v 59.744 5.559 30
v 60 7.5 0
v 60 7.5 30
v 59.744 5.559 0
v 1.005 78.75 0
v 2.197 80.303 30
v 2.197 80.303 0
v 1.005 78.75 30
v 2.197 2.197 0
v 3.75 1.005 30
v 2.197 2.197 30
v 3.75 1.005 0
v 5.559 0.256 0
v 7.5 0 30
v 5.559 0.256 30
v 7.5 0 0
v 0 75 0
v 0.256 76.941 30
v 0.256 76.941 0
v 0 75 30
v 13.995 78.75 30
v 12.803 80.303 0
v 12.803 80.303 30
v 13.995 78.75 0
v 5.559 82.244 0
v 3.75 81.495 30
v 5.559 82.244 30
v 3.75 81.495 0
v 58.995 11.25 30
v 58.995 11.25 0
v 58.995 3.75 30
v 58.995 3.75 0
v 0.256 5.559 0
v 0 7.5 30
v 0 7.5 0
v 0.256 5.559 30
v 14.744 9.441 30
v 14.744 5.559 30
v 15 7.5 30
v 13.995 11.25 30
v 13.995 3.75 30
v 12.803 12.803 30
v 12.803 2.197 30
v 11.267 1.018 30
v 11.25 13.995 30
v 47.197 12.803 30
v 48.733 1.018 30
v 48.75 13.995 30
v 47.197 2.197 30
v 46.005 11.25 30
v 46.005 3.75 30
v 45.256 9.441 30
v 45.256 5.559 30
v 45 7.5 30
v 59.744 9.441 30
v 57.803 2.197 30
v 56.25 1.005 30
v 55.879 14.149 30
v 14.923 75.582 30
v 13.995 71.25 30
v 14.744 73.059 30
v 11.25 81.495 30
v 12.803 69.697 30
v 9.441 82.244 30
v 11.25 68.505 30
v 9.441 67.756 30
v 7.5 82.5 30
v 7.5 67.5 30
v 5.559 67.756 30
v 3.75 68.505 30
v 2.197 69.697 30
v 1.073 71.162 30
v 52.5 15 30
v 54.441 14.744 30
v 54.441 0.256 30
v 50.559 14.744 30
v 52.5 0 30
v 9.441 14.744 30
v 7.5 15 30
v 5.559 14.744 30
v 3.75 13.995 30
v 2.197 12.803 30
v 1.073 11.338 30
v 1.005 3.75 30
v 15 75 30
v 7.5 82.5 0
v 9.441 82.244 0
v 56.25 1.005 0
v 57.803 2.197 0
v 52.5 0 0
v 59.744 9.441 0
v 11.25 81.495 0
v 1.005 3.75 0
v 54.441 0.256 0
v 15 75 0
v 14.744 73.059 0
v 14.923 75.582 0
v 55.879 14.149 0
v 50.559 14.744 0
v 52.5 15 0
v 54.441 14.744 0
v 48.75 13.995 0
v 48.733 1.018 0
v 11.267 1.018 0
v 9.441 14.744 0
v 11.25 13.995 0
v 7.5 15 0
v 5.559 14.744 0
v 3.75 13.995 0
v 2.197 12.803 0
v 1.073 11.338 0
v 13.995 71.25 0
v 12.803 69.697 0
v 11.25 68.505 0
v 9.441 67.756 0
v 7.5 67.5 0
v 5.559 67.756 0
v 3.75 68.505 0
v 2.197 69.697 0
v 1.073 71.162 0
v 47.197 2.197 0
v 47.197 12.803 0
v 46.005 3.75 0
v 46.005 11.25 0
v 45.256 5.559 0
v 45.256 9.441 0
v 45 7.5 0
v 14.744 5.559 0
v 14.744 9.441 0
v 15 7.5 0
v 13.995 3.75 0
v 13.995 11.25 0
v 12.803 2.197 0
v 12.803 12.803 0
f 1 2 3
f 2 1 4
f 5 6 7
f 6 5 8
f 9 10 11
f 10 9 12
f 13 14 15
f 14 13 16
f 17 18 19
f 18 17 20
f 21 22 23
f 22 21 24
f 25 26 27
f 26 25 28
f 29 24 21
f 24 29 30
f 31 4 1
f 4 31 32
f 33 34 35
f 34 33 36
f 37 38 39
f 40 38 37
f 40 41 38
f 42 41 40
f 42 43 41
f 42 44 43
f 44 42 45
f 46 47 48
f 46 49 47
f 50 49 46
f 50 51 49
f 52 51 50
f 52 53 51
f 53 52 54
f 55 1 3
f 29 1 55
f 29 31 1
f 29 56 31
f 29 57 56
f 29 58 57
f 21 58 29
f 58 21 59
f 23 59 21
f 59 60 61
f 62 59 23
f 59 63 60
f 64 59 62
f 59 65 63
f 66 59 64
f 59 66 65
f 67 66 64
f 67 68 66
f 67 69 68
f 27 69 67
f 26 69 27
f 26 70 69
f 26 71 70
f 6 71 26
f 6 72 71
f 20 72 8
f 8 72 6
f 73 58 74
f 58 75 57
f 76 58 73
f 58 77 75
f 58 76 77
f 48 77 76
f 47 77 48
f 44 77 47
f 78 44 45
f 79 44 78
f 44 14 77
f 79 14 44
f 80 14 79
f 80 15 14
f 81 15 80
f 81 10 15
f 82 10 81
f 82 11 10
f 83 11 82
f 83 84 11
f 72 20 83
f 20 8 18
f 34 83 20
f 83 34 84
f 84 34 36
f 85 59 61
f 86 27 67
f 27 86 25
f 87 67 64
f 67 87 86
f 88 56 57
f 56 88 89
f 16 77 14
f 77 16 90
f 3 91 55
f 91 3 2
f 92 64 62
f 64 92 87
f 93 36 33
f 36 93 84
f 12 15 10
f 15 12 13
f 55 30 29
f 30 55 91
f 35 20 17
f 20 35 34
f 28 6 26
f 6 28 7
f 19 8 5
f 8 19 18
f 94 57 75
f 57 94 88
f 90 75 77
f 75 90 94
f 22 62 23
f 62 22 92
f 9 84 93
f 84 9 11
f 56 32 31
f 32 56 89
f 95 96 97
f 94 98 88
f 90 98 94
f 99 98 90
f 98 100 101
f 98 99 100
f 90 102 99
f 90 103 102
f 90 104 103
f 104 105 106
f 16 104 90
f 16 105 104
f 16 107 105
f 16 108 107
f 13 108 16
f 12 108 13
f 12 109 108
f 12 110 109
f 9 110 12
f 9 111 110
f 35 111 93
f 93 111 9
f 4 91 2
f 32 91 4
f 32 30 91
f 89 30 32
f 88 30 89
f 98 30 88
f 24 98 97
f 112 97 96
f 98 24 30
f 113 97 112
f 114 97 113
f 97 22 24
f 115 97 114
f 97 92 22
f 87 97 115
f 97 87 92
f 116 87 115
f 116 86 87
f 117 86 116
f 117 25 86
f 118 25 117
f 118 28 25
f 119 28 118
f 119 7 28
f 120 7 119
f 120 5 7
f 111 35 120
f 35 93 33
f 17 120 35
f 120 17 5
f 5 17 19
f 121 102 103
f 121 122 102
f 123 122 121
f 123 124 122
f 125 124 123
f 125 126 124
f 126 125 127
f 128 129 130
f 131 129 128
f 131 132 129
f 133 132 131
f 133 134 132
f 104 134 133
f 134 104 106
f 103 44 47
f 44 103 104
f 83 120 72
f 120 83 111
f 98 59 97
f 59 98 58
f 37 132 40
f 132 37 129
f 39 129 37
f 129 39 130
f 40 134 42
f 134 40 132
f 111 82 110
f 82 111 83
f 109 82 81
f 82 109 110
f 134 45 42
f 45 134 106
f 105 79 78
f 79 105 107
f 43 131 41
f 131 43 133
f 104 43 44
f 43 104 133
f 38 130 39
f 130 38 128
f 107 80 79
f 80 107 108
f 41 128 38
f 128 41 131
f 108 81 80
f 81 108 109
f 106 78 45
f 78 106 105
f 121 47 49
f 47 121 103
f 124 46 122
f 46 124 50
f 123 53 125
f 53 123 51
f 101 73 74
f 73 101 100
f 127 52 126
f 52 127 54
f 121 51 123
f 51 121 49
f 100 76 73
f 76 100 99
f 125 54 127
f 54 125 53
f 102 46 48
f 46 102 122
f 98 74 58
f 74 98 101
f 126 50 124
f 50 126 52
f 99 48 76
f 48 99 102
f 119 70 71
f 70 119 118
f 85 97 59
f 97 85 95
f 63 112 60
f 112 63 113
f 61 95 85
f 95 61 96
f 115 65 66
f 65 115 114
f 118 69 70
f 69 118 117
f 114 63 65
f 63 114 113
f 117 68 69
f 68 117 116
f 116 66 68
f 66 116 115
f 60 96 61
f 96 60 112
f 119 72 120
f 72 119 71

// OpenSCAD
module rounded_control(base, height, length, radius){
	hull(){
		cylinder(length, radius, radius);
		translate([base, 0, 0])
			cylinder(length, radius, radius);
		translate([0, height, 0])
			cylinder(length, radius, radius);
	}
}

module bendy_control(base, height, length, radius){
	union(){
		difference(){
			translate([radius, radius, 0])
				rounded_control(base, height, length, radius);
			translate([1, 1, -.5 * length])
				translate([radius-1, radius-1, 0])
					rounded_control(base, height, 2*length, radius-1);
		}
		translate([radius, radius, 0]){
			cylinder(length, radius, radius);
			translate([base, 0, 0])
				cylinder(length, radius, radius);
			translate([0, height, 0])
				cylinder(length, radius, radius);
		}
	}
}

base = 30 * 1.5;
height = 45 * 1.5;
length = 20 * 1.5;
radius = 5 * 1.5;
bendy_control(base, height, length, radius);
